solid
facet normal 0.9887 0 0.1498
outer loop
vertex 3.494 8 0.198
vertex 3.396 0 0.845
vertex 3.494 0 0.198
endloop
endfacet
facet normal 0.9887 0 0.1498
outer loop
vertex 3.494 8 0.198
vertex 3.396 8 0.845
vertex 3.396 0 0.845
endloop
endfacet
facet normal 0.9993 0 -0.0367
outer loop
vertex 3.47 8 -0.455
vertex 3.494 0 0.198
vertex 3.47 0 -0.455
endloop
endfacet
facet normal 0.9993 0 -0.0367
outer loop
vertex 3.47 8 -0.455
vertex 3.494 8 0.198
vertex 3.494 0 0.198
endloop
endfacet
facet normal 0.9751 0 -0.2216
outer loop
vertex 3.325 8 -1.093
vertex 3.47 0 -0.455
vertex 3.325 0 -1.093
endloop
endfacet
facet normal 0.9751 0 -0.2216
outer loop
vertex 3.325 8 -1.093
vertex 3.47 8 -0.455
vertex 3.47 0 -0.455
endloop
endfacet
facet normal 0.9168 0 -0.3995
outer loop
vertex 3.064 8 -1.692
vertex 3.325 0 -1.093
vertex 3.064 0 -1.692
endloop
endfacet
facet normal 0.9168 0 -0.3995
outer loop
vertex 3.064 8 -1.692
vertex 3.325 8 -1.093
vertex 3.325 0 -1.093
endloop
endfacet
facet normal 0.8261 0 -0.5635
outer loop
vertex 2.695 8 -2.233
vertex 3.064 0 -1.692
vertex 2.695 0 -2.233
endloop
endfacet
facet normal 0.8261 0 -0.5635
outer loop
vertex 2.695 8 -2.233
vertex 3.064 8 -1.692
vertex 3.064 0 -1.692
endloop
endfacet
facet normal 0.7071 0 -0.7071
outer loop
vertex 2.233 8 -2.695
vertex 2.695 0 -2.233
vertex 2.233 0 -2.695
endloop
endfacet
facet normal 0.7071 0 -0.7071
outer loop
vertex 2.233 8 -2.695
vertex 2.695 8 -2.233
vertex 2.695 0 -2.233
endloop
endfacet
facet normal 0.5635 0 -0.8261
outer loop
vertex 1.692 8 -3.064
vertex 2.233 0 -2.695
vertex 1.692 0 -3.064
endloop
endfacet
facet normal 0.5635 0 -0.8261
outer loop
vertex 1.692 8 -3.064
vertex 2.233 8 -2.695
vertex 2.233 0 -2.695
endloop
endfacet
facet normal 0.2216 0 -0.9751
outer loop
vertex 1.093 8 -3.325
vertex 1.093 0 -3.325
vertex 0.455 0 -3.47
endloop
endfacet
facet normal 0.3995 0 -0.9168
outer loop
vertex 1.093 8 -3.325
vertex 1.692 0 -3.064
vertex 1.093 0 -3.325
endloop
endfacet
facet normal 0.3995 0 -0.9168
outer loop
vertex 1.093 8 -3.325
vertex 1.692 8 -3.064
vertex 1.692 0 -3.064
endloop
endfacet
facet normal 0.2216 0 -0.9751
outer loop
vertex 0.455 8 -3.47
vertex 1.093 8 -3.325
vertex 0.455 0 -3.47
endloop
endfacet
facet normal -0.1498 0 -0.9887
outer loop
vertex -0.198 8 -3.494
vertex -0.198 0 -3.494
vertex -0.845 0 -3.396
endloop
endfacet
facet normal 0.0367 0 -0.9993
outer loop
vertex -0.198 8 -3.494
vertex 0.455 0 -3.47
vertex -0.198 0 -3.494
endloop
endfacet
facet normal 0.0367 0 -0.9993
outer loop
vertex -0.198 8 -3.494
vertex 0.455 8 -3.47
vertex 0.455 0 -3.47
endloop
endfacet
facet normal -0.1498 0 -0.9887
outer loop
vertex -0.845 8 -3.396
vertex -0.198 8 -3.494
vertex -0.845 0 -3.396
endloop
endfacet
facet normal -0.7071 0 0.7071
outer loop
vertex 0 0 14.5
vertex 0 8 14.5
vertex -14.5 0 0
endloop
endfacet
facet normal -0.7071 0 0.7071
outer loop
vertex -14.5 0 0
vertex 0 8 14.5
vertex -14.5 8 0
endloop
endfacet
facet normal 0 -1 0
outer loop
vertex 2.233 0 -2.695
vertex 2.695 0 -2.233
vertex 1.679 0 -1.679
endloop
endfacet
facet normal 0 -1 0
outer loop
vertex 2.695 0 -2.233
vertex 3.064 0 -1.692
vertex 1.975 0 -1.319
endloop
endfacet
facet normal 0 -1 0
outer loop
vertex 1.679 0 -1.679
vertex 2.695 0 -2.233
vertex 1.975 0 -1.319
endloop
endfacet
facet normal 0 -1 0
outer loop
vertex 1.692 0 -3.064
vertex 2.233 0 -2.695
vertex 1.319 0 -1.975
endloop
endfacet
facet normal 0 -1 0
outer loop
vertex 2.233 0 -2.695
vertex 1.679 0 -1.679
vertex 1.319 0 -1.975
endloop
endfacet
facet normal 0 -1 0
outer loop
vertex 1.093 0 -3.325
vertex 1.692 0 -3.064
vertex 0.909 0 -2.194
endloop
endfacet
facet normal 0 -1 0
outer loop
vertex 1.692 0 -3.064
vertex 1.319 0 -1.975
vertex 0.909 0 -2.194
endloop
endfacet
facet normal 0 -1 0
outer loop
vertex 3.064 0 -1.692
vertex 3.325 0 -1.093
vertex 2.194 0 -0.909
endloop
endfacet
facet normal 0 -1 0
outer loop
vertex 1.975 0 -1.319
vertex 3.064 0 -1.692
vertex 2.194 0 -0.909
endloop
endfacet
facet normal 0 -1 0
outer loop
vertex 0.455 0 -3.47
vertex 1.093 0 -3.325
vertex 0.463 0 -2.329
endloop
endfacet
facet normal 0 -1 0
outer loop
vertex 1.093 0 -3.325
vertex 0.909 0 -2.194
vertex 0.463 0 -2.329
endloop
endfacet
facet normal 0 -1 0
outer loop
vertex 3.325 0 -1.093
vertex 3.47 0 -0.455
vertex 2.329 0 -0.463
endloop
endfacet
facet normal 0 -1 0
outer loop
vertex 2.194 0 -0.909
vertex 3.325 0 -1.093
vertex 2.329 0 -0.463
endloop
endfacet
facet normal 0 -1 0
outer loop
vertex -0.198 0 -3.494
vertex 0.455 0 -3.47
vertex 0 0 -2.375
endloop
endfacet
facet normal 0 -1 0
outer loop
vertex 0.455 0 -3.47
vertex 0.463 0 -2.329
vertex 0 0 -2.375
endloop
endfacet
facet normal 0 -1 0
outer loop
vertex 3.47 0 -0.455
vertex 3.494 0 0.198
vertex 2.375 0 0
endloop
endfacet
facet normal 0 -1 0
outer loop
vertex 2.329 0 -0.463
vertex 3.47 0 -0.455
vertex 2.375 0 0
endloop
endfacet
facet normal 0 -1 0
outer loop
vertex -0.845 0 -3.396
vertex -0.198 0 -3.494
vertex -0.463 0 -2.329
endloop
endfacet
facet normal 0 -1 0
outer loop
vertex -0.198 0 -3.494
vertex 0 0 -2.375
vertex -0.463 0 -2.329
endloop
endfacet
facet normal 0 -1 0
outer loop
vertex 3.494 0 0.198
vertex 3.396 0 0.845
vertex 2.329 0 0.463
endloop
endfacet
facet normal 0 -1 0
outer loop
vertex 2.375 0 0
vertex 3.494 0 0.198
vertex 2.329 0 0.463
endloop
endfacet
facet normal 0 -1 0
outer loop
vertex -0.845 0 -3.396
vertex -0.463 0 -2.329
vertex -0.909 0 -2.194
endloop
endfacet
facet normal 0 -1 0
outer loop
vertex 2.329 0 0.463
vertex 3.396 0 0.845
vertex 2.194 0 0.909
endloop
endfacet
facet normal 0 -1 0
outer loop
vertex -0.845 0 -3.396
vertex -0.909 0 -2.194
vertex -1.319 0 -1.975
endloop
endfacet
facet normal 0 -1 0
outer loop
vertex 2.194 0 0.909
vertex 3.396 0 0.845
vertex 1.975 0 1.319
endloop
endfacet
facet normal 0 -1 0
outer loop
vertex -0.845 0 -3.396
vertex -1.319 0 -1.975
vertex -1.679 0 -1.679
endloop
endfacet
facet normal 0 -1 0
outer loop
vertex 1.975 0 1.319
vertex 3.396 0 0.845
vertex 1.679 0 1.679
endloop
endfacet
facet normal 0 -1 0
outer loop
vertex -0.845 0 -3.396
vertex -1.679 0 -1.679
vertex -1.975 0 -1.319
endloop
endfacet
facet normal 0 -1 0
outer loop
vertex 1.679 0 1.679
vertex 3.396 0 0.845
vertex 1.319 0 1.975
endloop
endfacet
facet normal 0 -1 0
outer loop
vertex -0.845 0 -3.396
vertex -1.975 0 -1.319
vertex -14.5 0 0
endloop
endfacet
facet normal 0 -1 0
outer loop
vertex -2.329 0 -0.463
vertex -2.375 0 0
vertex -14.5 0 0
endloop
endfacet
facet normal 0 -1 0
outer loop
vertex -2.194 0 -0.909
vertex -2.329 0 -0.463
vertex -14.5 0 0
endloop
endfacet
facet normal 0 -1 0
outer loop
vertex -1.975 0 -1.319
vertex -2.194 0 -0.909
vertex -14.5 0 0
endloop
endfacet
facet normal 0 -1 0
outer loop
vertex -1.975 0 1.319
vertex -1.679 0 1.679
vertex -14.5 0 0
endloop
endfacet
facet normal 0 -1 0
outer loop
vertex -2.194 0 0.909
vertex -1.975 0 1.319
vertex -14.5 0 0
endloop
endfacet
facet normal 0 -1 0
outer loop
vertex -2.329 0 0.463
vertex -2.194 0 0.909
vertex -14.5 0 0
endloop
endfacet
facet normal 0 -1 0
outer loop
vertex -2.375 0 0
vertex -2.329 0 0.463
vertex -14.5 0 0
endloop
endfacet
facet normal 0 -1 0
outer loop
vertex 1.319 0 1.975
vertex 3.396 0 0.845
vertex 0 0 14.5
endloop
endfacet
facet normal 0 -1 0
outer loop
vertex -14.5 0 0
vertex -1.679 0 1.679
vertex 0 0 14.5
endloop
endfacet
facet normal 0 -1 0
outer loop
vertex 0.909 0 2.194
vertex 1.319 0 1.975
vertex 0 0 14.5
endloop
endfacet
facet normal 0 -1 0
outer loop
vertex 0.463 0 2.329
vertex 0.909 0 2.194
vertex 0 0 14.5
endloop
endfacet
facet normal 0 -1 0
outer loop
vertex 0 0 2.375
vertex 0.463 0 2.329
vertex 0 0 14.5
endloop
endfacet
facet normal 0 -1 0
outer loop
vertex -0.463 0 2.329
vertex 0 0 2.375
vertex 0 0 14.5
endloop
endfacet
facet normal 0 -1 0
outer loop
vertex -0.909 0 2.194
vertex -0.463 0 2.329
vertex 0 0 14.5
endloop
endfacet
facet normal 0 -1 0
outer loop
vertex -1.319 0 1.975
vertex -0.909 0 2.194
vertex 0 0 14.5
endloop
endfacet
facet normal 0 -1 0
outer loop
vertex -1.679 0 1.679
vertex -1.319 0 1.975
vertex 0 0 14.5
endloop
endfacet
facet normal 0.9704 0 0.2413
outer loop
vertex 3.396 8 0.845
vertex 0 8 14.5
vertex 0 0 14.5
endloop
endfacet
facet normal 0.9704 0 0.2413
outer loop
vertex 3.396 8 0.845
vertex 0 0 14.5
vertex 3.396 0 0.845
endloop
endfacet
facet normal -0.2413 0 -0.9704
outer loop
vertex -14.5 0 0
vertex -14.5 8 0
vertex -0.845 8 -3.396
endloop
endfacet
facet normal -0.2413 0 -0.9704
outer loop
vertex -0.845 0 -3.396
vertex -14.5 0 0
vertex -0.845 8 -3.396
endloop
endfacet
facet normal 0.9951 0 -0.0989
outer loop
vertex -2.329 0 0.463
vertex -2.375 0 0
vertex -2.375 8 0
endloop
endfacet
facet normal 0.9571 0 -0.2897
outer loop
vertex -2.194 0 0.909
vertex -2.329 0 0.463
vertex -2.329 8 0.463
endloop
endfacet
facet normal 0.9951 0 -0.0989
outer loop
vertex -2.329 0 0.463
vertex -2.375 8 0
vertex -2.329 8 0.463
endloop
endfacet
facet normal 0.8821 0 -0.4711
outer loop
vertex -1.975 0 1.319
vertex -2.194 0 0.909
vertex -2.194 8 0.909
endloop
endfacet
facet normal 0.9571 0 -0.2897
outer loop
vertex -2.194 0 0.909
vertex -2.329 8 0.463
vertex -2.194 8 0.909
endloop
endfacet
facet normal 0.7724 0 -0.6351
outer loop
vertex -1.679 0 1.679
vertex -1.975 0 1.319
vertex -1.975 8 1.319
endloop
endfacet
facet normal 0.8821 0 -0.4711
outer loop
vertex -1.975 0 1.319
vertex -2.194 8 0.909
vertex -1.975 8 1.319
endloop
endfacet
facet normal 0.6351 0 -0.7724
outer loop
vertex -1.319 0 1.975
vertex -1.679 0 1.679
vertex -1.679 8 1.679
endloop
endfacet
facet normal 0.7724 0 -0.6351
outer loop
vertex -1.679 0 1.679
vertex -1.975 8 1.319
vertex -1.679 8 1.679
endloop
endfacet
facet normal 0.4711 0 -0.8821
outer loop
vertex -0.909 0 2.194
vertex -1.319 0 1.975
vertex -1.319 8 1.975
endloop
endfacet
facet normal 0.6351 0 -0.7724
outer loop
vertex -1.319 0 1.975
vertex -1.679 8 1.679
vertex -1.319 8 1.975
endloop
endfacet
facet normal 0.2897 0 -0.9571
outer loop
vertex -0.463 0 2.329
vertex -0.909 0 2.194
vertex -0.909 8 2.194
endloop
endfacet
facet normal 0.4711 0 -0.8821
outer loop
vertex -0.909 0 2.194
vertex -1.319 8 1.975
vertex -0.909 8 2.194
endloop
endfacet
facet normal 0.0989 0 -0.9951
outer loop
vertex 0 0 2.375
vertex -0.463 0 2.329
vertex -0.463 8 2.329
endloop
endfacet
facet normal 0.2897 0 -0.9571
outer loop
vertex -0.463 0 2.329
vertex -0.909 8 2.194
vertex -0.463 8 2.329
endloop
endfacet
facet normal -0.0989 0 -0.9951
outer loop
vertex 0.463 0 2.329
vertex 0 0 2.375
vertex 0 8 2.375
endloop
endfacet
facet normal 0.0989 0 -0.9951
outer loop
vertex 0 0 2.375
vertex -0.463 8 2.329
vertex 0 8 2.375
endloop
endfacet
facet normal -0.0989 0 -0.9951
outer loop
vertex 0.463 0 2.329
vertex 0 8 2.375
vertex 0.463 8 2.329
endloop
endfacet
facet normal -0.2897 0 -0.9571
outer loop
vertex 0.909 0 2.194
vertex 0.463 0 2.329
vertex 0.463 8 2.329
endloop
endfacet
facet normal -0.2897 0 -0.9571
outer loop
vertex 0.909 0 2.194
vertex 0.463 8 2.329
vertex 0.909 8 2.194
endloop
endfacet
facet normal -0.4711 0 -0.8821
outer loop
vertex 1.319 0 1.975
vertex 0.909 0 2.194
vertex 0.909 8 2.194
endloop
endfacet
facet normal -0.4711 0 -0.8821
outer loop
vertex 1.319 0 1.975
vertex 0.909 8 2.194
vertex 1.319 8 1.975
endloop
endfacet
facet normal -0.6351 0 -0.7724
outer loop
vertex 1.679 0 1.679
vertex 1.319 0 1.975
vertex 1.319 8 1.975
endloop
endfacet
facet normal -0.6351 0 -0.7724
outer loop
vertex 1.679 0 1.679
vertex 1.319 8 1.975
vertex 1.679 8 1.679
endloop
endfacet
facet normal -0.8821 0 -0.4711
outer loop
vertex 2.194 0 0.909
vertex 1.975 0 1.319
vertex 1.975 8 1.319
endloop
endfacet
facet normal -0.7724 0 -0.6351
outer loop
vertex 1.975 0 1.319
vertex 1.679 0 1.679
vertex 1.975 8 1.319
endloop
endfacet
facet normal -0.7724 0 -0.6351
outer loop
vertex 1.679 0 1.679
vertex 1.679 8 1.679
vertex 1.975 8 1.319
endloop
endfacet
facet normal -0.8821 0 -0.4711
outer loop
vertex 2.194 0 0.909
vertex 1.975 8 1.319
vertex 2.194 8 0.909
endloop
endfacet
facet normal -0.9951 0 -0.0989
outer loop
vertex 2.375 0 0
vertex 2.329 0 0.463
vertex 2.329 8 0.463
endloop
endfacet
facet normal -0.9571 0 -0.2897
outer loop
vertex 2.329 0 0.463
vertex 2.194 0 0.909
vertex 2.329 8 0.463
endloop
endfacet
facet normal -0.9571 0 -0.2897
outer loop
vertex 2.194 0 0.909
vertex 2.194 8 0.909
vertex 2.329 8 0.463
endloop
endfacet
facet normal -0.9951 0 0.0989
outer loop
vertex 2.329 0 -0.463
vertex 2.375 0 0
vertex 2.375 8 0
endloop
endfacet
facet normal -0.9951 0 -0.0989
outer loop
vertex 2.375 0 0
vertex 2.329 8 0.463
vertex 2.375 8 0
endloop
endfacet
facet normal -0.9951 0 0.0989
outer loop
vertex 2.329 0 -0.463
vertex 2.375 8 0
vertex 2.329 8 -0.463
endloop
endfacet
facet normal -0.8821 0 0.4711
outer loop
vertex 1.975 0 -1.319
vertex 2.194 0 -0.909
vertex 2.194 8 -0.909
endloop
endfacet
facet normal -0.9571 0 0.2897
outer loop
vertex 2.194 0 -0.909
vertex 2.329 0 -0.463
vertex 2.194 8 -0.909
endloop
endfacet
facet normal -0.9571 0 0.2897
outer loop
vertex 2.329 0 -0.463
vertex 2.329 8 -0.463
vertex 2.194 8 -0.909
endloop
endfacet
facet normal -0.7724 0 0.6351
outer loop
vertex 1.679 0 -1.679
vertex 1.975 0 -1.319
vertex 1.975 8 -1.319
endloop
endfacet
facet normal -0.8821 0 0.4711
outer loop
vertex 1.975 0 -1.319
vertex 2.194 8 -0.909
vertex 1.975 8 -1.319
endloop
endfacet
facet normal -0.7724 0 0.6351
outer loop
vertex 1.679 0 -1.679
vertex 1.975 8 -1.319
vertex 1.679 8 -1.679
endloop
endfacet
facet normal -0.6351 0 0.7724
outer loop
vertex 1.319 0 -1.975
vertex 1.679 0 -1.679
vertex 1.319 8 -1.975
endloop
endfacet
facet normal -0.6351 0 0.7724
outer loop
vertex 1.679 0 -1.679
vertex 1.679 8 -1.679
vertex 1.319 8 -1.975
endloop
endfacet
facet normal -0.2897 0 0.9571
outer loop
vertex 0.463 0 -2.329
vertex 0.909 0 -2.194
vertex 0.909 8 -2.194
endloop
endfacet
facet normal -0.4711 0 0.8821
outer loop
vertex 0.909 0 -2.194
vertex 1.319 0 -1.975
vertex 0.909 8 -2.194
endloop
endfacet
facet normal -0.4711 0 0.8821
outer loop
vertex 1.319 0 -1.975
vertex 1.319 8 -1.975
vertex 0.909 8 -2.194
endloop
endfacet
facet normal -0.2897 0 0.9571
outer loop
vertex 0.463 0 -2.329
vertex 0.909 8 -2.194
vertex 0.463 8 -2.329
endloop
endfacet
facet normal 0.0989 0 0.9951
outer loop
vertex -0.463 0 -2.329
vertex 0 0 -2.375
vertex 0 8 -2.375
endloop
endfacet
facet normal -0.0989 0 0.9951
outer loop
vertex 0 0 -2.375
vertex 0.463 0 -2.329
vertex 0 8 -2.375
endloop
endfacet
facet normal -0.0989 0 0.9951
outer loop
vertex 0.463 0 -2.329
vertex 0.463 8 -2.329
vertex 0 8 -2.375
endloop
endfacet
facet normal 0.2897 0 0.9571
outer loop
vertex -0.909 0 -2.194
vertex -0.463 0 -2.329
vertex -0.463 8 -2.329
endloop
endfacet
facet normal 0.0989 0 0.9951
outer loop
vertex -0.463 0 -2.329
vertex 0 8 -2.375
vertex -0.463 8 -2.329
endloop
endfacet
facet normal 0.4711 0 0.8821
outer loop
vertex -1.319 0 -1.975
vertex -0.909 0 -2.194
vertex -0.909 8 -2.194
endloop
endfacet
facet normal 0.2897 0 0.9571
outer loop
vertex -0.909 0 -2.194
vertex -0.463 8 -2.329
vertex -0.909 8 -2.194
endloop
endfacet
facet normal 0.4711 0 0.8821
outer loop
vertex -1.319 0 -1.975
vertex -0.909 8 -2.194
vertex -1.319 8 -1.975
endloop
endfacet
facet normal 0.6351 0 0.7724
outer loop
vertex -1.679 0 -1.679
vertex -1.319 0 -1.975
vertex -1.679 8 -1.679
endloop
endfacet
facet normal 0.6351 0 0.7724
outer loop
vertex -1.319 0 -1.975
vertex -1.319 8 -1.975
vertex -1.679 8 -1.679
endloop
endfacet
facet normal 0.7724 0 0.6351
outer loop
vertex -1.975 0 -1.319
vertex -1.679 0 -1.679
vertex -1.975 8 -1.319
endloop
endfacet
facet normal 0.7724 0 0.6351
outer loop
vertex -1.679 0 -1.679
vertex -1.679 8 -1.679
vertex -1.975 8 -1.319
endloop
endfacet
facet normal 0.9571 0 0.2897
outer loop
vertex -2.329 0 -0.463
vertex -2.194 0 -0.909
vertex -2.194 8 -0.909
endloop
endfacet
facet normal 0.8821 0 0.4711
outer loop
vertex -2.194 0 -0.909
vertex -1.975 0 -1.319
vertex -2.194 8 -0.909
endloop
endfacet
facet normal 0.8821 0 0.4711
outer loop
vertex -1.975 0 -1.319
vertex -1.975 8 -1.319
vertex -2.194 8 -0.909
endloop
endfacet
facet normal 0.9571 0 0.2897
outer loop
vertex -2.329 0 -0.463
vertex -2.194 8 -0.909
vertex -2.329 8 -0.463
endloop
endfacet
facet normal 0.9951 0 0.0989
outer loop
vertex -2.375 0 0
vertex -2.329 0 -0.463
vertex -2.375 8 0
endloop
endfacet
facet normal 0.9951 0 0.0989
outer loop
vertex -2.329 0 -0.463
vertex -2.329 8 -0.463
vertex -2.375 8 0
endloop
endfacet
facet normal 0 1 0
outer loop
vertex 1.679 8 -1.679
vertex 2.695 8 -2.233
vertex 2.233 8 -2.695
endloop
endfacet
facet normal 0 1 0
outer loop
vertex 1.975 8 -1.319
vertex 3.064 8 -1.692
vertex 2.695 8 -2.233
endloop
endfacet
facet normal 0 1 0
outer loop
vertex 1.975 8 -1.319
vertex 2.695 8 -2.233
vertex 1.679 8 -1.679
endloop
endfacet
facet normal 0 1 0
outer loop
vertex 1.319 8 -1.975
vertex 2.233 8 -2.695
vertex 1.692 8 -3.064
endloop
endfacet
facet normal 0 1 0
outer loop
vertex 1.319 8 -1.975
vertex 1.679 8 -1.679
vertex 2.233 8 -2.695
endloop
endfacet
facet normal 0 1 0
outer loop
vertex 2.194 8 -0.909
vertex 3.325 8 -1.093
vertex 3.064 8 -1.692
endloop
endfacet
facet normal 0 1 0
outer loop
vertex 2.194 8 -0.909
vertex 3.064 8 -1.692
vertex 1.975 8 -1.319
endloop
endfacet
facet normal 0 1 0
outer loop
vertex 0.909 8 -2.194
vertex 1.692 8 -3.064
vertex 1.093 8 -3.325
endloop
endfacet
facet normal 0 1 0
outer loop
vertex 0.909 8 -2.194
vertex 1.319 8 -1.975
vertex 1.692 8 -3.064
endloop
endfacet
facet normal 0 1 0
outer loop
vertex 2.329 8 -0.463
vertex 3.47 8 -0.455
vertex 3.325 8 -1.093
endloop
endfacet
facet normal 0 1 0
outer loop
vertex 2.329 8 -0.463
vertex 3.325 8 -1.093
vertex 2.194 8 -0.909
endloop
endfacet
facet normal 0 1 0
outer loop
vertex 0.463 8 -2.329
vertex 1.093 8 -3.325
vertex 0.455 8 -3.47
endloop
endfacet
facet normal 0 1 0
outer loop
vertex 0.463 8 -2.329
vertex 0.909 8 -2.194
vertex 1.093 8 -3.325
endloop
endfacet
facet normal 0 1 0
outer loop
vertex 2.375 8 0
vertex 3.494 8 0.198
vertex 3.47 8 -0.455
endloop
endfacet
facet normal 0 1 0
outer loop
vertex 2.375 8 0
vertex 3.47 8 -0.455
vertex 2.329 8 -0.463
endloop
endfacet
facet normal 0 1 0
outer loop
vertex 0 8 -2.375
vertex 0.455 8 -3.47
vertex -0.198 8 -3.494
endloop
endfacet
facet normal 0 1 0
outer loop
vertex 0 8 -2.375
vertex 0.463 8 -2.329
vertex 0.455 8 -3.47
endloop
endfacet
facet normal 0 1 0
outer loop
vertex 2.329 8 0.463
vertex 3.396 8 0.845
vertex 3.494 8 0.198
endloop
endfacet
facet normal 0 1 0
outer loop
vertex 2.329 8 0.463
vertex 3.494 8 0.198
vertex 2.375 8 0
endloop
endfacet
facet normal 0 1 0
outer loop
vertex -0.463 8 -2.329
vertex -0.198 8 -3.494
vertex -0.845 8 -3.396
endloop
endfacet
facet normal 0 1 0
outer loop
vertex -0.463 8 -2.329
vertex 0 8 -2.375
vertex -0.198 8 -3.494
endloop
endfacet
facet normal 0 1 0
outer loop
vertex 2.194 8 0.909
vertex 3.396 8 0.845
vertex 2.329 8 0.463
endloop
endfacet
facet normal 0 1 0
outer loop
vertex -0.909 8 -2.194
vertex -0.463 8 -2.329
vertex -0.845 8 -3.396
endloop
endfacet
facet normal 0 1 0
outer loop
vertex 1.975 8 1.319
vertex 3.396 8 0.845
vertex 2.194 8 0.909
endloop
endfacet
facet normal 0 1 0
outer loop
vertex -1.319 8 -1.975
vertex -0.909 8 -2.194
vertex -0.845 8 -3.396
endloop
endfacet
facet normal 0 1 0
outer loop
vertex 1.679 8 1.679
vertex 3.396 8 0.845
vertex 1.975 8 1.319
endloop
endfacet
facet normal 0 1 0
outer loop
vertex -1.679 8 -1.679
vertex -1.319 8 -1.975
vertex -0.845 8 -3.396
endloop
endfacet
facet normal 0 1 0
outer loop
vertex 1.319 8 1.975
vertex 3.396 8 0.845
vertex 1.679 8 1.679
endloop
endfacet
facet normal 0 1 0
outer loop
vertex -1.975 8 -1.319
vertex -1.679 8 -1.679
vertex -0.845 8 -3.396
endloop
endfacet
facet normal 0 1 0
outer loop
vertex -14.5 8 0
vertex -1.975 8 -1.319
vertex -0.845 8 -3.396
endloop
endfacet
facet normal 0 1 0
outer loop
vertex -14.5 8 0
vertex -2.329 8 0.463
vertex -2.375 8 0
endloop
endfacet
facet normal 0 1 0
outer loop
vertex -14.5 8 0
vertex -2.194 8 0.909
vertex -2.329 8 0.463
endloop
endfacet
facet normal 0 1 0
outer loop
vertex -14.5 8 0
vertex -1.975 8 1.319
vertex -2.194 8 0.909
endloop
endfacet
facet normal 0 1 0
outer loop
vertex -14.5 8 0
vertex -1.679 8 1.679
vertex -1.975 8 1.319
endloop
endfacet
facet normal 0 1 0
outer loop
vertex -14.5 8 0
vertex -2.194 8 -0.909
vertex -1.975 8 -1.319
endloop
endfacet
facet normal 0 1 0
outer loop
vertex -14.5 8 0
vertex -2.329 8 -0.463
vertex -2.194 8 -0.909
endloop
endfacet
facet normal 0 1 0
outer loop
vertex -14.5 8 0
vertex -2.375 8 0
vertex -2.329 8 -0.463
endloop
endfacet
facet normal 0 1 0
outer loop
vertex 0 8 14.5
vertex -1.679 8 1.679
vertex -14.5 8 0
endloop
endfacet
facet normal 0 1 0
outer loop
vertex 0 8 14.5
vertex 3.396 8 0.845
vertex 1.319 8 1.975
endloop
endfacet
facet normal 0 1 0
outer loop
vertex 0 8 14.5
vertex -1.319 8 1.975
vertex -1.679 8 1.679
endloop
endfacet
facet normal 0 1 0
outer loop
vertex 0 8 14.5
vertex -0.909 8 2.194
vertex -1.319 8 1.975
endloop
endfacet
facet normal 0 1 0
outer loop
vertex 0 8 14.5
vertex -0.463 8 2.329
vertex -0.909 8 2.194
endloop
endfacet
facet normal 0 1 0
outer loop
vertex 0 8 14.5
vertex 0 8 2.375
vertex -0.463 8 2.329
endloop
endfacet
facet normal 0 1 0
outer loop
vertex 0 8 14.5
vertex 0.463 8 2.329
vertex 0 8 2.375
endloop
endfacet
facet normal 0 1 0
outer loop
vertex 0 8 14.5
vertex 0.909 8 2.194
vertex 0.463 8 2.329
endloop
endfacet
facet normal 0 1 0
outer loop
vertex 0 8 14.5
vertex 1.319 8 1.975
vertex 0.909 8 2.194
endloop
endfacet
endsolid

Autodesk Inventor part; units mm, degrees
ref_plane "YZ Plane" through (0, 0, 0) normal (1, 0, 0) x (0, 1, 0)
ref_plane "XZ Plane" through (0, 0, 0) normal (0, 1, 0) x (-1, 0, 0)
ref_plane "XY Plane" through (0, 0, 0) normal (0, 0, 1) x (1, 0, 0)
sketch "Sketch1" plane through (0, 0, 0) normal (0, 1, 0) x (-1, 0, 0)
  circle A0 centre (0, 0) radius 14.5
  line L0 (0, 0) -> (14.5, 0)
  line L1 (0, 0) -> (0, 14.5)
  dimension "d0" = 29
extrude "Extrusion1" add sketch "Sketch1" along normal blind 8 contours L0 L1 A0 picked at (1.0755, 9.5455)
sketch "Sketch2" plane through (0, 8, 0) normal (0, 1, 0) x (1, 0, 0)
  line L0 (0, -14.5) -> (0, 0) projected
  circle A0 centre (0, 0) radius 2.375
  circle A1 centre (0, 0) radius 3.5
  arc A2 (-14.5, 0) -> (0, -14.5) centre (0, 0) ccw projected
  line L1 (0, -14.5) -> (3.3965, -0.8448)
  line L2 (0, 0) -> (-14.5, 0) projected
  line L3 (-14.5, 0) -> (-0.8448, 3.3965)
  point P0 (-2.375, 0)
  point P1 (0, -2.375)
  dimension "d3" = 4.75
  dimension "d4" = 7
extrude "Extrusion2" add sketch "Sketch2" against normal blind 8 contours L0 A1 L1 | L0 A0 L2 A1 | L3 A1 L2 picked at (3.0951, 0.2624)
sketch "Sketch3" plane through (0, 8, 0) normal (0, 1, 0) x (1, 0, 0)
  line L0 (0, 0) -> (-2.375, 0) projected
  circle A0 centre (0, 0) radius 2.375
extrude "Extrusion3" cut sketch "Sketch3" against normal blind 8
sketch "Sketch4" plane through (0, 8, 0) normal (0, 1, 0) x (1, 0, 0)
  arc A0 (-14.5, 0) -> (0, -14.5) centre (0, 0) ccw projected
  line L0 (-14.5, 0) -> (-0.8448, 3.3965) projected
  line L1 (0, -14.5) -> (-14.5, 0)
  line L2 (-14.5, 0) -> (-23.5148, -10.1914)
  line L3 (-23.5148, -10.1914) -> (-2.2293, -23.4627)
  line L4 (3.3965, -0.8448) -> (0, -14.5) projected
  line L5 (-2.2293, -23.4627) -> (0, -14.5)
extrude "Extrusion4" cut sketch "Sketch4" against normal blind 10 contours L1 A0
properties part number "bell_crank_v2"
